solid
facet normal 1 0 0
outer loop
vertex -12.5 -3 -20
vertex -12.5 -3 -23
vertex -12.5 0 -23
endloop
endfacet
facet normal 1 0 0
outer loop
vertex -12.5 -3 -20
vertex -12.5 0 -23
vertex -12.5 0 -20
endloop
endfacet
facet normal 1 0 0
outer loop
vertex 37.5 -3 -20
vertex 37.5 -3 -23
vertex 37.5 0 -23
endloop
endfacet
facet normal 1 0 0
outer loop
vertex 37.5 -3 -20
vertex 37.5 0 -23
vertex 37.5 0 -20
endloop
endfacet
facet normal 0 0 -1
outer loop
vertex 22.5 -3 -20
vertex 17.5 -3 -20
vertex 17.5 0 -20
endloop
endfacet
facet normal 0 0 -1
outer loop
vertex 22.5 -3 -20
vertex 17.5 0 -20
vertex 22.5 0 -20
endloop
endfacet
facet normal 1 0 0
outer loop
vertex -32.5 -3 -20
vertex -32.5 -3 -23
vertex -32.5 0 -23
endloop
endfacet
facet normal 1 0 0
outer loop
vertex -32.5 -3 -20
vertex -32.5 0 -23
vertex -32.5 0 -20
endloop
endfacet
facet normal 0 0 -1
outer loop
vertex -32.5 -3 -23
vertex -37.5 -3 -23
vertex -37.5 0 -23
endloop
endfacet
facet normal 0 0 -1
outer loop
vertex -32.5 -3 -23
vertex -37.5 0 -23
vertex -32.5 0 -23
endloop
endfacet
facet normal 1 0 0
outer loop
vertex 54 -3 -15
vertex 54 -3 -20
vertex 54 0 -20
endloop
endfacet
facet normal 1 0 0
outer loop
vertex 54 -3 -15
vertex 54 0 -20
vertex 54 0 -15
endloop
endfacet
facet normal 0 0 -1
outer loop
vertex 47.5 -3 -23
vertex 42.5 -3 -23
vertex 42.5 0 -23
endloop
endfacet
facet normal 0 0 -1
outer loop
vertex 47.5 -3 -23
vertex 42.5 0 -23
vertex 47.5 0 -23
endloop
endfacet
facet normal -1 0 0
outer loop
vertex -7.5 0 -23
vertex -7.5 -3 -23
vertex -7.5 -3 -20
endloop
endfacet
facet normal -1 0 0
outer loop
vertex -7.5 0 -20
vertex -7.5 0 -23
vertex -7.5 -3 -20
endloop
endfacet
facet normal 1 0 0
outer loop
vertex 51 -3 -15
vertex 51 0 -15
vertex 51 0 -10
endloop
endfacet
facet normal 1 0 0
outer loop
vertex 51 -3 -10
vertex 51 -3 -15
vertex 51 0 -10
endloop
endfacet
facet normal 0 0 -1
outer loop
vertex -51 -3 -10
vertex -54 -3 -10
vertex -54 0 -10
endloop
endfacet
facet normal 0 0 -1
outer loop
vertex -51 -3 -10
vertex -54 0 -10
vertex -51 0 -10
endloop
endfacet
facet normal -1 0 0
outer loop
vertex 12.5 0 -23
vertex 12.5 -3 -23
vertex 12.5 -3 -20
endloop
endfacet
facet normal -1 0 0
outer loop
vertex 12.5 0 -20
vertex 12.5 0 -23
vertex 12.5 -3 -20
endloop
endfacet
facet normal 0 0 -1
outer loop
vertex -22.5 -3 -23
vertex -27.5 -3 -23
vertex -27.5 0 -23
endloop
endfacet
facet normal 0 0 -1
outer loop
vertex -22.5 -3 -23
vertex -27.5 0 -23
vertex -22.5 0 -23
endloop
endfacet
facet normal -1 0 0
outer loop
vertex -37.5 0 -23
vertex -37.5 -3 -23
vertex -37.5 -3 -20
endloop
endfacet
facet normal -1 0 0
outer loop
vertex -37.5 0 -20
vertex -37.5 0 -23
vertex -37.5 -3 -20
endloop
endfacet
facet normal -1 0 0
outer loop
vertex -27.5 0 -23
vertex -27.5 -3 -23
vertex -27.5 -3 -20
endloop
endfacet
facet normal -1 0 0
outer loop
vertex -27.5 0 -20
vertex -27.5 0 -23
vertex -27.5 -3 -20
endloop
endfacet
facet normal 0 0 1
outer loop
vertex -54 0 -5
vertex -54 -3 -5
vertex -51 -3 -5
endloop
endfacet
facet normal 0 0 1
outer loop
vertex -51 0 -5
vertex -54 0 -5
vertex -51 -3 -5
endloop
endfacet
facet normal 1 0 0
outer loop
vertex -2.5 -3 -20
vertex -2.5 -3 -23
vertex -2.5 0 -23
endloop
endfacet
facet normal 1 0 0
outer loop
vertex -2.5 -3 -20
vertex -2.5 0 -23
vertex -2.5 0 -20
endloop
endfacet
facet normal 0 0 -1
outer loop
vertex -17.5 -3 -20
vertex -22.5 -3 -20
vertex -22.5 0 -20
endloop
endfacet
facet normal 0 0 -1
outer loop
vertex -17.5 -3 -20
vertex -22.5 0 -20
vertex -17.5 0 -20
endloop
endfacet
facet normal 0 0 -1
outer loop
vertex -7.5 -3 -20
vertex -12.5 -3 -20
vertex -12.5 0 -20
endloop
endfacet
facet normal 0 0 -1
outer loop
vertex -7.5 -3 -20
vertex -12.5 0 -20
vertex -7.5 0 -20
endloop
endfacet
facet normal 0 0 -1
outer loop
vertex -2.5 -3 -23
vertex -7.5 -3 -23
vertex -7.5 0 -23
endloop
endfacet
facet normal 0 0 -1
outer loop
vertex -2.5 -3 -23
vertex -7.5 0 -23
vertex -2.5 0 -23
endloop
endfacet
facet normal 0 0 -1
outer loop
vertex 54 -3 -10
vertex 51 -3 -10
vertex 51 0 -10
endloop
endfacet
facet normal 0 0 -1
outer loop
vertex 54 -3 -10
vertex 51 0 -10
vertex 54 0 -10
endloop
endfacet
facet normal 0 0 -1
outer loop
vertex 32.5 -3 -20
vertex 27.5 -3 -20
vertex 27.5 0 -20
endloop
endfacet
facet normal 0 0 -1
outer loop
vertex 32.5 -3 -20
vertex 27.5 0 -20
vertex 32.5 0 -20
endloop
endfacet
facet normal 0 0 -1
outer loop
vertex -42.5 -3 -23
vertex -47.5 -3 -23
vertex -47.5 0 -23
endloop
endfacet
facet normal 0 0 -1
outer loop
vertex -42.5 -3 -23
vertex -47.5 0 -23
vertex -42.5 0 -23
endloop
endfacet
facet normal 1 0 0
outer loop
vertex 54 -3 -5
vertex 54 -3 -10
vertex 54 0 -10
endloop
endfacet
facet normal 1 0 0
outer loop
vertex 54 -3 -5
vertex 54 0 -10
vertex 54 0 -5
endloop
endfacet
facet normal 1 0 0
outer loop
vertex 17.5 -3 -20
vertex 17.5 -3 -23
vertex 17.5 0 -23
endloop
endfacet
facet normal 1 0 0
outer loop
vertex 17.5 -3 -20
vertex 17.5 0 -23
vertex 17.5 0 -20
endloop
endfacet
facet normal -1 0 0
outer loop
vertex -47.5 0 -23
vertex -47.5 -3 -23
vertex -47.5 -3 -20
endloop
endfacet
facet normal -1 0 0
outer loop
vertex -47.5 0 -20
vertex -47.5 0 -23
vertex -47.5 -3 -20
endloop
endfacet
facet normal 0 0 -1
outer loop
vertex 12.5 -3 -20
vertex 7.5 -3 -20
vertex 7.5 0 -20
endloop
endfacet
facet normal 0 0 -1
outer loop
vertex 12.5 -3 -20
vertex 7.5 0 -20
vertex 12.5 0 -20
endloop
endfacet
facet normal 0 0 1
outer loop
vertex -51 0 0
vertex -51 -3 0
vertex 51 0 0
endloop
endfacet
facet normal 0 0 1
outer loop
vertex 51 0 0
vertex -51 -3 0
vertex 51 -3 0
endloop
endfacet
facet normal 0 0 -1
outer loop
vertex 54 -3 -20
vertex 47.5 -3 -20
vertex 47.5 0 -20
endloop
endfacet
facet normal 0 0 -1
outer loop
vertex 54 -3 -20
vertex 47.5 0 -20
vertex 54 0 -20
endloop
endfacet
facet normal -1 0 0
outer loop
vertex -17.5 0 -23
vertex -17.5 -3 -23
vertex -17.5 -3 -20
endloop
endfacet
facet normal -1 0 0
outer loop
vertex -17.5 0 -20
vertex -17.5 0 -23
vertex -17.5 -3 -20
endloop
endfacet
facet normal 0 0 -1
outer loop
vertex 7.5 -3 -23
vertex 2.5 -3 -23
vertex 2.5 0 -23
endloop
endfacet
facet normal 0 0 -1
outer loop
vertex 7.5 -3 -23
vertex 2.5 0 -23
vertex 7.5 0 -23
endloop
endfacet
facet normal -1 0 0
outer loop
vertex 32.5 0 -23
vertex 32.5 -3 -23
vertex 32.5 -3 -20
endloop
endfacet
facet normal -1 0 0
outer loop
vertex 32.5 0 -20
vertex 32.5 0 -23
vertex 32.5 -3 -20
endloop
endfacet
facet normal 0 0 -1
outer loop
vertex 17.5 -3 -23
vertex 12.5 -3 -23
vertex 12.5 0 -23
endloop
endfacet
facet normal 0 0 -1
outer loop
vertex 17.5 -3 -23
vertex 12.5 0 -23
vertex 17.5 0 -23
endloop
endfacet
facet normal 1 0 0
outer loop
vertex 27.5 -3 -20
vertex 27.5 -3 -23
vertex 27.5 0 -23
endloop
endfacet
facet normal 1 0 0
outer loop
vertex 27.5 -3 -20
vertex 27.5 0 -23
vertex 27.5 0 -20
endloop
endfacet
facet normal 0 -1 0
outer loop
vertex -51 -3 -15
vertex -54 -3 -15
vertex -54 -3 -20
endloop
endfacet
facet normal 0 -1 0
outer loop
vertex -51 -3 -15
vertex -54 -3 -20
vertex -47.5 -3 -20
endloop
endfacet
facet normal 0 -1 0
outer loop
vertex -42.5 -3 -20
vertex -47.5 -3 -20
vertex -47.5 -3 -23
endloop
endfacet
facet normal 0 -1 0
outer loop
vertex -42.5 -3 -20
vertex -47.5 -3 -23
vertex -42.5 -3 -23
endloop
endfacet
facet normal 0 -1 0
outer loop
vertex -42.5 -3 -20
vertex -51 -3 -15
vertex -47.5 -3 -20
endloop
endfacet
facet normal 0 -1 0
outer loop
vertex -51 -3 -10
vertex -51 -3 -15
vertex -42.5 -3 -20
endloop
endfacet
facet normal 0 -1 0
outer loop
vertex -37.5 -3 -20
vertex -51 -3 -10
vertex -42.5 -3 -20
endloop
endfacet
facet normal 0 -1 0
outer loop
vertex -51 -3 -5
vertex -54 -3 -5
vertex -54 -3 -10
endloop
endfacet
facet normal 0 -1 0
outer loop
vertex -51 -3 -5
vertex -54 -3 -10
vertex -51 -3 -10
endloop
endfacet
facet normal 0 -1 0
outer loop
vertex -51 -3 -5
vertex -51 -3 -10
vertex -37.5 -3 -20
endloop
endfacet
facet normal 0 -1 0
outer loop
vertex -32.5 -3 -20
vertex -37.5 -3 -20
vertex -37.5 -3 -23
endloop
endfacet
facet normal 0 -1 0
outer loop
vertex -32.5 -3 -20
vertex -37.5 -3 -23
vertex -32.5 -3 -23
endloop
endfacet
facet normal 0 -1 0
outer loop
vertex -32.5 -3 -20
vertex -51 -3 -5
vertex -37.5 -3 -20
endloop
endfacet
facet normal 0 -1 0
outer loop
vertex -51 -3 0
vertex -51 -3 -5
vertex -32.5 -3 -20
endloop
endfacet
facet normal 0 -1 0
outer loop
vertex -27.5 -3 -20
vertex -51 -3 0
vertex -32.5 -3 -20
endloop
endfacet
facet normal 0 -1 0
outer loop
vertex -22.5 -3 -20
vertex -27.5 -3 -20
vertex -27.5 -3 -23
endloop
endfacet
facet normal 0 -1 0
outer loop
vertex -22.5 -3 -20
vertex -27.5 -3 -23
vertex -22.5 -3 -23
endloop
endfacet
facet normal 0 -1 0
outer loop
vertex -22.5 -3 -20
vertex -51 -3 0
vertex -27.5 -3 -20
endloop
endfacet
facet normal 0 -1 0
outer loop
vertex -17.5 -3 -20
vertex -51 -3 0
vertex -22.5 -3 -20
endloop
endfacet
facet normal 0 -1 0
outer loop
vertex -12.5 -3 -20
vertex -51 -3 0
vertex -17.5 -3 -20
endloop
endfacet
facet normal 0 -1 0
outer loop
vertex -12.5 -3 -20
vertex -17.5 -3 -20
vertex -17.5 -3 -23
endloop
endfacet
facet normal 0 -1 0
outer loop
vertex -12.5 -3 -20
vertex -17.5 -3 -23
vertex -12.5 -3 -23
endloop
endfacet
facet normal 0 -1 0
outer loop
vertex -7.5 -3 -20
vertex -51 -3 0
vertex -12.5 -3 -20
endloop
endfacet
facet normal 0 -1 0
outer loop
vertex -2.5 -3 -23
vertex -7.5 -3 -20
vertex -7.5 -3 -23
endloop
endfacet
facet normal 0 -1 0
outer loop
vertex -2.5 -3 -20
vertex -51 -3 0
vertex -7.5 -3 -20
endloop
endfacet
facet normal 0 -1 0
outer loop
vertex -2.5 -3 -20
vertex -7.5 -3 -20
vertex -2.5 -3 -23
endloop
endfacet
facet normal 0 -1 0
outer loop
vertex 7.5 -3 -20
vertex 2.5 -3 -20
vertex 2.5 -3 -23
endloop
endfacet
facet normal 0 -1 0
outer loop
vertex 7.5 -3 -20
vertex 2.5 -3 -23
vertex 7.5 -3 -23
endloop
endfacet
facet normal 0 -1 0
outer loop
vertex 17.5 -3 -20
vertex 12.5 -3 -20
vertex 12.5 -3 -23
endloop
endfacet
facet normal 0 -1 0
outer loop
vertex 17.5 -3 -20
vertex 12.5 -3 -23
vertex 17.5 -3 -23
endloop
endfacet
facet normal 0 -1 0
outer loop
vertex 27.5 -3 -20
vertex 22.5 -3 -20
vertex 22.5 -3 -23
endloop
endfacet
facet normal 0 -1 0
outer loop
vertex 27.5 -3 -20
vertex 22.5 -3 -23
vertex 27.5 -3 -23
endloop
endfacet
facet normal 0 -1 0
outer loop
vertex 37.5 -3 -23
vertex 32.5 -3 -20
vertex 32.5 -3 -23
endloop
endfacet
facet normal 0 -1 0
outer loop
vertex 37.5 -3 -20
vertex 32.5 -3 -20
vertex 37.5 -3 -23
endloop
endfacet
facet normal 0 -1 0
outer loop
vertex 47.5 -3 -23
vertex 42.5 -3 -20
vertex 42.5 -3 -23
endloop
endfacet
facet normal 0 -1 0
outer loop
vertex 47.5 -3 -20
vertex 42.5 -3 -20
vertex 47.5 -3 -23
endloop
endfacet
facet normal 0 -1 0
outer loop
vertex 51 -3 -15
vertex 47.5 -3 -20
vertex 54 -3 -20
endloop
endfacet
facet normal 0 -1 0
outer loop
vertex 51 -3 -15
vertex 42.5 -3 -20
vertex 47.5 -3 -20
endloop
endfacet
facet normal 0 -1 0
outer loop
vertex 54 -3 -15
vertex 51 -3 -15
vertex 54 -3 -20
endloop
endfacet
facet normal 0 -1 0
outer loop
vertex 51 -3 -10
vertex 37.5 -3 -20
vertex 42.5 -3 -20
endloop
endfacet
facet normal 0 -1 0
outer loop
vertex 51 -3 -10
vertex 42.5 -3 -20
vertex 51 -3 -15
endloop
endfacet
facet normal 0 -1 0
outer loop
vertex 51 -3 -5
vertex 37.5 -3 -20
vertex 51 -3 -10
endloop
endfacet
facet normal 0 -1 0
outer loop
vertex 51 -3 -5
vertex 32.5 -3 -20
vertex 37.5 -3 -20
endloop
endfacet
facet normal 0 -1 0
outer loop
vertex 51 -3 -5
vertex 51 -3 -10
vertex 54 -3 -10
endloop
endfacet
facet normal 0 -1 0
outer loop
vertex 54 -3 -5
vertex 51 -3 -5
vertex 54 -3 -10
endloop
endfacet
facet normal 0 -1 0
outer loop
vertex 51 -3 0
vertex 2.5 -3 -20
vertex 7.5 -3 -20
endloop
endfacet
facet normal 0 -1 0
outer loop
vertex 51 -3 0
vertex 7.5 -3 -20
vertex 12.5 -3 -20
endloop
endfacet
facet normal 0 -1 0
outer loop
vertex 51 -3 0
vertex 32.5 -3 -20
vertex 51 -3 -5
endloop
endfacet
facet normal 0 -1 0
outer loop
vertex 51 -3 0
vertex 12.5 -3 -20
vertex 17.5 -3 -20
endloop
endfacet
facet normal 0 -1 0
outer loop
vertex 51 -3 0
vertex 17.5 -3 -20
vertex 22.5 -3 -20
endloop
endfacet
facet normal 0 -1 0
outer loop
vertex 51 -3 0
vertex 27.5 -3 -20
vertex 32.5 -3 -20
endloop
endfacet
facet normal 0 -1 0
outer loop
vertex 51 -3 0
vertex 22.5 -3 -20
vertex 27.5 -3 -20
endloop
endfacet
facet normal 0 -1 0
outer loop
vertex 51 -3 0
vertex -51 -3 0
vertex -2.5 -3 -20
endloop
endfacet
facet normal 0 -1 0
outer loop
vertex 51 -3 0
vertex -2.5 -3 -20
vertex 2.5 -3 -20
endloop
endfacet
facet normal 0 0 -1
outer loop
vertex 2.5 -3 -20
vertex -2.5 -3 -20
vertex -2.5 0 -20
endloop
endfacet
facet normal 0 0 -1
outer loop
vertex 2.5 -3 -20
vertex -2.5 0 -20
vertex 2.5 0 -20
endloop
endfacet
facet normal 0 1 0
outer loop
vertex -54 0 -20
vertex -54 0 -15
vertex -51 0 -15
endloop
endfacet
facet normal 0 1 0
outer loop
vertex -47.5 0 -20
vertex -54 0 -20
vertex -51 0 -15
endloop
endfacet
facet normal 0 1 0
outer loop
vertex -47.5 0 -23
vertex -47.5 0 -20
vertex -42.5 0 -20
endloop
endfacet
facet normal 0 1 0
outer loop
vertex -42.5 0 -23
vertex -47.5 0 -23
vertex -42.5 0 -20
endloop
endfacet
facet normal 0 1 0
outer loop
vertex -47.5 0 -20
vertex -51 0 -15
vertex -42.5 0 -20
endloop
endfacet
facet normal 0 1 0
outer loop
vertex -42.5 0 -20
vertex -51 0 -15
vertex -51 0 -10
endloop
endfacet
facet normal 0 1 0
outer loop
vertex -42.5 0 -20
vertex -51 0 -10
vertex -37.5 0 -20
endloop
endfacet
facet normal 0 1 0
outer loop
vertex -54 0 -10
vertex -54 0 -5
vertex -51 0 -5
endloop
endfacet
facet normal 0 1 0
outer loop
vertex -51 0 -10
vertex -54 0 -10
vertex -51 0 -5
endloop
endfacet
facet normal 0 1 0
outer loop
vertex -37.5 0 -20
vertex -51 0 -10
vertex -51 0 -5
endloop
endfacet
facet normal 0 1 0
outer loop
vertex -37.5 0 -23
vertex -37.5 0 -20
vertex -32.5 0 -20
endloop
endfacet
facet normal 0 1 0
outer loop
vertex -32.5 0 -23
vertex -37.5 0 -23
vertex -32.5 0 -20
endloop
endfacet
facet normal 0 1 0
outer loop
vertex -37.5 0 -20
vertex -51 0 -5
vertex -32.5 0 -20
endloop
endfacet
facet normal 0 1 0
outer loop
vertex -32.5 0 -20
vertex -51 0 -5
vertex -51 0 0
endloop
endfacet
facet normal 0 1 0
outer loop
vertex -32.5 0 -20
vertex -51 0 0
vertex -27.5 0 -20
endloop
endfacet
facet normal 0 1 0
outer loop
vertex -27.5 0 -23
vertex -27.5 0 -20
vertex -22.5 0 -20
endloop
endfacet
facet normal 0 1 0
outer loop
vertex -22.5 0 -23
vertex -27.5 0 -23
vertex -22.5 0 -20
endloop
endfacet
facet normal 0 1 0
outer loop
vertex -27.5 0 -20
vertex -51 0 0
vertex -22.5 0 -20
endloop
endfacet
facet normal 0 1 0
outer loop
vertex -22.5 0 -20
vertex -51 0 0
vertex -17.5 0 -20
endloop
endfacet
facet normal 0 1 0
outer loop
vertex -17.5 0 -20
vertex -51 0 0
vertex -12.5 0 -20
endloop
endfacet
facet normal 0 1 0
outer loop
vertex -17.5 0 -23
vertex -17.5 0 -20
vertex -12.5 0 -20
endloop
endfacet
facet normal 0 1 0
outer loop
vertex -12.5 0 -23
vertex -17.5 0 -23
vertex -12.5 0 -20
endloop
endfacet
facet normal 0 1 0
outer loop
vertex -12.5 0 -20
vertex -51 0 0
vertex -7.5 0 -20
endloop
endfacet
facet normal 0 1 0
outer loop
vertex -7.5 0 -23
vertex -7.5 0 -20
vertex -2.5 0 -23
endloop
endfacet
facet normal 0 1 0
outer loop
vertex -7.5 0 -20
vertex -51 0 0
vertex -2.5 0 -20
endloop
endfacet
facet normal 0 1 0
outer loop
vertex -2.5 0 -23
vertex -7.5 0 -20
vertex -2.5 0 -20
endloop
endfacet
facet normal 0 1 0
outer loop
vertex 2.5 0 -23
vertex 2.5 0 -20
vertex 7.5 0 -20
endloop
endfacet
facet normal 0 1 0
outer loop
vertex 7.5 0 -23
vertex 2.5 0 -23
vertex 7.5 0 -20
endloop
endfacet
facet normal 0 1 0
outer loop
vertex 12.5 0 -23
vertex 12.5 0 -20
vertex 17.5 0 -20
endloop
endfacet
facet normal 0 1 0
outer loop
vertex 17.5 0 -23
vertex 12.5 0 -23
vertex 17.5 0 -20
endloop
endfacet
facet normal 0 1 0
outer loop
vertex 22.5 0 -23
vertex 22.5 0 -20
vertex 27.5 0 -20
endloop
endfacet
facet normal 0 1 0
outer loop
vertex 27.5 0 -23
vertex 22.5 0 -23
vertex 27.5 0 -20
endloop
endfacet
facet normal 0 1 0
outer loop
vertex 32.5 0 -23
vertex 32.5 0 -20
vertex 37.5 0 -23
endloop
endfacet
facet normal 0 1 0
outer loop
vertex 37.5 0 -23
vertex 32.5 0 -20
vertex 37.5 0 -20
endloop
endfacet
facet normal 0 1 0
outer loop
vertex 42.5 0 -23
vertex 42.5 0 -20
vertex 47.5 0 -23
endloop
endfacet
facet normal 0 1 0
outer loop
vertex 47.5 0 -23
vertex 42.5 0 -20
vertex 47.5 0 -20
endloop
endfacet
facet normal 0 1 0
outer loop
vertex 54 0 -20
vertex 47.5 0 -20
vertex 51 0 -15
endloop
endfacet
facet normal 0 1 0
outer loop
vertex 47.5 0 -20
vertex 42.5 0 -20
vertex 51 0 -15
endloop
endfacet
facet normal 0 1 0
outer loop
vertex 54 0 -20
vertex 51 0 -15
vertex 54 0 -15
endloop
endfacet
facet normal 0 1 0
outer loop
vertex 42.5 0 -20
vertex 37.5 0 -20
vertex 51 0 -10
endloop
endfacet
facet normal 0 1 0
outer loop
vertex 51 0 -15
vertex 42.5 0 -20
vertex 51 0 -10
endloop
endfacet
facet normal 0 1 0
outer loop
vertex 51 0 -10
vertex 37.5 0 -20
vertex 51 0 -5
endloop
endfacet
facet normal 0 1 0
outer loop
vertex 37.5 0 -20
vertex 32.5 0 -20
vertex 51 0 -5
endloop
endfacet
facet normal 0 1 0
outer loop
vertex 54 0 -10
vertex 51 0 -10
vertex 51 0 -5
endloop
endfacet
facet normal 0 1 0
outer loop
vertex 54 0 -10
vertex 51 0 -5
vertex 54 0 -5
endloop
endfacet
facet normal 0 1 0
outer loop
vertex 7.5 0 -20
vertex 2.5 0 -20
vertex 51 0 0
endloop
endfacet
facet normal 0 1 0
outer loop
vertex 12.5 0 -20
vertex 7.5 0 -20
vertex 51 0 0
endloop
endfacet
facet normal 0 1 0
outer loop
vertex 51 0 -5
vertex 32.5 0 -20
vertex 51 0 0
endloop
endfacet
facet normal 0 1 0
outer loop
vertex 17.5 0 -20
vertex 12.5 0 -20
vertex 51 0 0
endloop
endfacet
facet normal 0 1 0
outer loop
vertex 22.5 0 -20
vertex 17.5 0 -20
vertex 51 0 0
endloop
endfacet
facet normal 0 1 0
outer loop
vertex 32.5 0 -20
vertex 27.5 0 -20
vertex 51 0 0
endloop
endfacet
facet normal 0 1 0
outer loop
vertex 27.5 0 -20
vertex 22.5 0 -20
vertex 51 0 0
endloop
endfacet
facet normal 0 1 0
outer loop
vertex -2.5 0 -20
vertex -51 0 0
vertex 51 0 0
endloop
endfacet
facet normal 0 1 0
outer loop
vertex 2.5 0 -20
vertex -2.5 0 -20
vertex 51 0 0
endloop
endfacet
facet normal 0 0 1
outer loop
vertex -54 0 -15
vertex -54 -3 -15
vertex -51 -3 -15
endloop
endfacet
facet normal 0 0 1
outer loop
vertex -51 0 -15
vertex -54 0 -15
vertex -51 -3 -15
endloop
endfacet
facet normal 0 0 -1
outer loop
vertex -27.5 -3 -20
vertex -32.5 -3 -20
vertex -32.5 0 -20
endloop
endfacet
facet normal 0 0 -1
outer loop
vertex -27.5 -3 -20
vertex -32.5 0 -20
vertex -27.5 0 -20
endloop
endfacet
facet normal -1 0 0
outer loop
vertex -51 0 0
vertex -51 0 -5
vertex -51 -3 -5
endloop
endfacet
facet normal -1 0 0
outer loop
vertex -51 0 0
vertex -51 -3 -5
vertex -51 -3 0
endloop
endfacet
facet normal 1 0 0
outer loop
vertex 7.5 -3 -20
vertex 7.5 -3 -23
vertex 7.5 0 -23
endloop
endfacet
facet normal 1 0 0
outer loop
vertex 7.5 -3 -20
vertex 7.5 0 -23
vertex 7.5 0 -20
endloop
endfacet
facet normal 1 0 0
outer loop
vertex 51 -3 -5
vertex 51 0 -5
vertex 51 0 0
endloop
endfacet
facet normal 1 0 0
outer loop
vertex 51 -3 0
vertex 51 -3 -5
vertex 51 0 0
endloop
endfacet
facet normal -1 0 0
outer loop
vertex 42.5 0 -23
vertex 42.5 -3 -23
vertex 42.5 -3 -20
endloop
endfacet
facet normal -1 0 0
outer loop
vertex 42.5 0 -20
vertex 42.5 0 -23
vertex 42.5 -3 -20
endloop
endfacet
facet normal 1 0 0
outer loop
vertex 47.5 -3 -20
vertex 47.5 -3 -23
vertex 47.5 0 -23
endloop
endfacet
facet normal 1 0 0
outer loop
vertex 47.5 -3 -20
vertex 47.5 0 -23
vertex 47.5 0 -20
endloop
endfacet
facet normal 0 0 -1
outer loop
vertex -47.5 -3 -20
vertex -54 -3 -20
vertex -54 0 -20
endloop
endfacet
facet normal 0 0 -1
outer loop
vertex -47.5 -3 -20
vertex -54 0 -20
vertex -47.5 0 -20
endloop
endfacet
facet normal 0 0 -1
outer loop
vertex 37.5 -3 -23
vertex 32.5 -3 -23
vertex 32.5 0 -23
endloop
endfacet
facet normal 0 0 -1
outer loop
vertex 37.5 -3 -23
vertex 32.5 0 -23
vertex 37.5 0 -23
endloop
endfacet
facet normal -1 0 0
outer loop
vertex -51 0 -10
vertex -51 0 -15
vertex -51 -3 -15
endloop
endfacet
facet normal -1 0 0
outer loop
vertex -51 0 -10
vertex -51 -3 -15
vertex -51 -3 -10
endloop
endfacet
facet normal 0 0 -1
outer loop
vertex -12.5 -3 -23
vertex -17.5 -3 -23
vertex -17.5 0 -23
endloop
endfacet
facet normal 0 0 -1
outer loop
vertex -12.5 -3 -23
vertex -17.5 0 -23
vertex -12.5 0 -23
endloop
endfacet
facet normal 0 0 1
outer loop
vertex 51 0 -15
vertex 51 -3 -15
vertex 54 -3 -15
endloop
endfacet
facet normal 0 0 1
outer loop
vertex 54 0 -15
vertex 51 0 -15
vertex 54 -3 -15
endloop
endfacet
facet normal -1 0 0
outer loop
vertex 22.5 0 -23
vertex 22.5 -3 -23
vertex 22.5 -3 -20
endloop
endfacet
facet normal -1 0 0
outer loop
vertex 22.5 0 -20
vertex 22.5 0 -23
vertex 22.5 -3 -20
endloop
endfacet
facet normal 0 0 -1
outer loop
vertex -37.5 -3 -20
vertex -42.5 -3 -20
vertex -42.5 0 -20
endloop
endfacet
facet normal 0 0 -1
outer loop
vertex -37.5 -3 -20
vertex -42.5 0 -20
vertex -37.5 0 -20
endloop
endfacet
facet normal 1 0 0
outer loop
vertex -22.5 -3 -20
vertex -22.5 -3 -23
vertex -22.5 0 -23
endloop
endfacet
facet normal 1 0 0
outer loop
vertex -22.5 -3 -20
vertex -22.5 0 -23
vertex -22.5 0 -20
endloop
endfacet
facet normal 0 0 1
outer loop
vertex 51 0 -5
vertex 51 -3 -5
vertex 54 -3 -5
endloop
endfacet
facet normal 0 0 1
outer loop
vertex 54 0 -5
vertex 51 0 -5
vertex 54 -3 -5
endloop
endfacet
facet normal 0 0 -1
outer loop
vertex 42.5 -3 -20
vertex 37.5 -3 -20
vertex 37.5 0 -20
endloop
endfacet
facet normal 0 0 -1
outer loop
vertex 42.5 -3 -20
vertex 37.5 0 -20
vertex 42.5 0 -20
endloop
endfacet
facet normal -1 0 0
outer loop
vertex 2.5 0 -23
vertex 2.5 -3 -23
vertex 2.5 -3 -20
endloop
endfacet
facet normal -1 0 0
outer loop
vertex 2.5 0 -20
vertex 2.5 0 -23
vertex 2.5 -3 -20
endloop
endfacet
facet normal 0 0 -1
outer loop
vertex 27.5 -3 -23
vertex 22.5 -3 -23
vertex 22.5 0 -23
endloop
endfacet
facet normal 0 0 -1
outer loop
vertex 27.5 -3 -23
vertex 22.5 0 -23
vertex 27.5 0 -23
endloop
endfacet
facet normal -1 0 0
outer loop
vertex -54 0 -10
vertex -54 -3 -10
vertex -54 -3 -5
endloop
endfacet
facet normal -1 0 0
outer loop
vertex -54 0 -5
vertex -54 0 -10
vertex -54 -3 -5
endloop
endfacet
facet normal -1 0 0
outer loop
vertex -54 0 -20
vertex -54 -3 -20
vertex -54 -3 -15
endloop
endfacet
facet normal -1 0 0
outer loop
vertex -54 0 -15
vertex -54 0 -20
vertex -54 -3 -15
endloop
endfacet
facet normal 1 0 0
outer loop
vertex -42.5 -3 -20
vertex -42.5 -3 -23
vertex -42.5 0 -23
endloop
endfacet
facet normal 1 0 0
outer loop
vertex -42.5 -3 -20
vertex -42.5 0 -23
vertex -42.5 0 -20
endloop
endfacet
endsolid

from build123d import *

# Parameters (mm, degrees)
F0_W     = 102
F0_H     = 40
F1_DEPTH = 3
F2_W     = 3
F2_H     = 5
F3_DEPTH = 3
F4_W     = 5
F4_H     = 3
F5_DEPTH = 3
F6_W     = 109.860795
F6_H     = 22.121532
F7_DEPTH = 25


with BuildPart() as f1:
    # F0 (on Front) → F1 (new body)
    with BuildSketch(Plane.XZ):
        Rectangle(F0_W, F0_H)
    extrude(amount=F1_DEPTH)

    # F2 (on face) → F3 (join)
    with BuildSketch(Plane.XZ.offset(3)):
        with Locations((-52.5, -17.5)):
            Rectangle(F2_W, F2_H)
        with Locations((-52.5, -7.5)):
            Rectangle(F2_W, F2_H)
        with Locations((-52.5, 2.5)):
            Rectangle(F2_W, F2_H)
        with Locations((-52.5, 12.5)):
            Rectangle(F2_W, F2_H)
        with Locations((52.5, -7.5)):
            Rectangle(F2_W, F2_H)
        with Locations((52.5, -17.5)):
            Rectangle(F2_W, F2_H)
        with Locations((52.5, 12.5)):
            Rectangle(F2_W, F2_H)
        with Locations((52.5, 2.5)):
            Rectangle(F2_W, F2_H)
    extrude(amount=-F3_DEPTH)

    # F4 (on face) → F5 (join)
    with BuildSketch(Plane.XZ.offset(3)):
        with Locations((5, -21.5)):
            Rectangle(F4_W, F4_H)
        with Locations((15, -21.5)):
            Rectangle(F4_W, F4_H)
        with Locations((25, -21.5)):
            Rectangle(F4_W, F4_H)
        with Locations((35, -21.5)):
            Rectangle(F4_W, F4_H)
        with Locations((45, -21.5)):
            Rectangle(F4_W, F4_H)
        with Locations((-25, -21.5)):
            Rectangle(F4_W, F4_H)
        with Locations((-15, -21.5)):
            Rectangle(F4_W, F4_H)
        with Locations((-5, -21.5)):
            Rectangle(F4_W, F4_H)
        with Locations((-35, -21.5)):
            Rectangle(F4_W, F4_H)
        with Locations((-45, -21.5)):
            Rectangle(F4_W, F4_H)
    extrude(amount=-F5_DEPTH)

    # F6 (on face) → F7 (cut)
    with BuildSketch(Plane.XZ.offset(3)):
        with Locations((0.930397, 11.060766)):
            Rectangle(F6_W, F6_H)
    extrude(amount=-F7_DEPTH, mode=Mode.SUBTRACT)


solid = f1.part
